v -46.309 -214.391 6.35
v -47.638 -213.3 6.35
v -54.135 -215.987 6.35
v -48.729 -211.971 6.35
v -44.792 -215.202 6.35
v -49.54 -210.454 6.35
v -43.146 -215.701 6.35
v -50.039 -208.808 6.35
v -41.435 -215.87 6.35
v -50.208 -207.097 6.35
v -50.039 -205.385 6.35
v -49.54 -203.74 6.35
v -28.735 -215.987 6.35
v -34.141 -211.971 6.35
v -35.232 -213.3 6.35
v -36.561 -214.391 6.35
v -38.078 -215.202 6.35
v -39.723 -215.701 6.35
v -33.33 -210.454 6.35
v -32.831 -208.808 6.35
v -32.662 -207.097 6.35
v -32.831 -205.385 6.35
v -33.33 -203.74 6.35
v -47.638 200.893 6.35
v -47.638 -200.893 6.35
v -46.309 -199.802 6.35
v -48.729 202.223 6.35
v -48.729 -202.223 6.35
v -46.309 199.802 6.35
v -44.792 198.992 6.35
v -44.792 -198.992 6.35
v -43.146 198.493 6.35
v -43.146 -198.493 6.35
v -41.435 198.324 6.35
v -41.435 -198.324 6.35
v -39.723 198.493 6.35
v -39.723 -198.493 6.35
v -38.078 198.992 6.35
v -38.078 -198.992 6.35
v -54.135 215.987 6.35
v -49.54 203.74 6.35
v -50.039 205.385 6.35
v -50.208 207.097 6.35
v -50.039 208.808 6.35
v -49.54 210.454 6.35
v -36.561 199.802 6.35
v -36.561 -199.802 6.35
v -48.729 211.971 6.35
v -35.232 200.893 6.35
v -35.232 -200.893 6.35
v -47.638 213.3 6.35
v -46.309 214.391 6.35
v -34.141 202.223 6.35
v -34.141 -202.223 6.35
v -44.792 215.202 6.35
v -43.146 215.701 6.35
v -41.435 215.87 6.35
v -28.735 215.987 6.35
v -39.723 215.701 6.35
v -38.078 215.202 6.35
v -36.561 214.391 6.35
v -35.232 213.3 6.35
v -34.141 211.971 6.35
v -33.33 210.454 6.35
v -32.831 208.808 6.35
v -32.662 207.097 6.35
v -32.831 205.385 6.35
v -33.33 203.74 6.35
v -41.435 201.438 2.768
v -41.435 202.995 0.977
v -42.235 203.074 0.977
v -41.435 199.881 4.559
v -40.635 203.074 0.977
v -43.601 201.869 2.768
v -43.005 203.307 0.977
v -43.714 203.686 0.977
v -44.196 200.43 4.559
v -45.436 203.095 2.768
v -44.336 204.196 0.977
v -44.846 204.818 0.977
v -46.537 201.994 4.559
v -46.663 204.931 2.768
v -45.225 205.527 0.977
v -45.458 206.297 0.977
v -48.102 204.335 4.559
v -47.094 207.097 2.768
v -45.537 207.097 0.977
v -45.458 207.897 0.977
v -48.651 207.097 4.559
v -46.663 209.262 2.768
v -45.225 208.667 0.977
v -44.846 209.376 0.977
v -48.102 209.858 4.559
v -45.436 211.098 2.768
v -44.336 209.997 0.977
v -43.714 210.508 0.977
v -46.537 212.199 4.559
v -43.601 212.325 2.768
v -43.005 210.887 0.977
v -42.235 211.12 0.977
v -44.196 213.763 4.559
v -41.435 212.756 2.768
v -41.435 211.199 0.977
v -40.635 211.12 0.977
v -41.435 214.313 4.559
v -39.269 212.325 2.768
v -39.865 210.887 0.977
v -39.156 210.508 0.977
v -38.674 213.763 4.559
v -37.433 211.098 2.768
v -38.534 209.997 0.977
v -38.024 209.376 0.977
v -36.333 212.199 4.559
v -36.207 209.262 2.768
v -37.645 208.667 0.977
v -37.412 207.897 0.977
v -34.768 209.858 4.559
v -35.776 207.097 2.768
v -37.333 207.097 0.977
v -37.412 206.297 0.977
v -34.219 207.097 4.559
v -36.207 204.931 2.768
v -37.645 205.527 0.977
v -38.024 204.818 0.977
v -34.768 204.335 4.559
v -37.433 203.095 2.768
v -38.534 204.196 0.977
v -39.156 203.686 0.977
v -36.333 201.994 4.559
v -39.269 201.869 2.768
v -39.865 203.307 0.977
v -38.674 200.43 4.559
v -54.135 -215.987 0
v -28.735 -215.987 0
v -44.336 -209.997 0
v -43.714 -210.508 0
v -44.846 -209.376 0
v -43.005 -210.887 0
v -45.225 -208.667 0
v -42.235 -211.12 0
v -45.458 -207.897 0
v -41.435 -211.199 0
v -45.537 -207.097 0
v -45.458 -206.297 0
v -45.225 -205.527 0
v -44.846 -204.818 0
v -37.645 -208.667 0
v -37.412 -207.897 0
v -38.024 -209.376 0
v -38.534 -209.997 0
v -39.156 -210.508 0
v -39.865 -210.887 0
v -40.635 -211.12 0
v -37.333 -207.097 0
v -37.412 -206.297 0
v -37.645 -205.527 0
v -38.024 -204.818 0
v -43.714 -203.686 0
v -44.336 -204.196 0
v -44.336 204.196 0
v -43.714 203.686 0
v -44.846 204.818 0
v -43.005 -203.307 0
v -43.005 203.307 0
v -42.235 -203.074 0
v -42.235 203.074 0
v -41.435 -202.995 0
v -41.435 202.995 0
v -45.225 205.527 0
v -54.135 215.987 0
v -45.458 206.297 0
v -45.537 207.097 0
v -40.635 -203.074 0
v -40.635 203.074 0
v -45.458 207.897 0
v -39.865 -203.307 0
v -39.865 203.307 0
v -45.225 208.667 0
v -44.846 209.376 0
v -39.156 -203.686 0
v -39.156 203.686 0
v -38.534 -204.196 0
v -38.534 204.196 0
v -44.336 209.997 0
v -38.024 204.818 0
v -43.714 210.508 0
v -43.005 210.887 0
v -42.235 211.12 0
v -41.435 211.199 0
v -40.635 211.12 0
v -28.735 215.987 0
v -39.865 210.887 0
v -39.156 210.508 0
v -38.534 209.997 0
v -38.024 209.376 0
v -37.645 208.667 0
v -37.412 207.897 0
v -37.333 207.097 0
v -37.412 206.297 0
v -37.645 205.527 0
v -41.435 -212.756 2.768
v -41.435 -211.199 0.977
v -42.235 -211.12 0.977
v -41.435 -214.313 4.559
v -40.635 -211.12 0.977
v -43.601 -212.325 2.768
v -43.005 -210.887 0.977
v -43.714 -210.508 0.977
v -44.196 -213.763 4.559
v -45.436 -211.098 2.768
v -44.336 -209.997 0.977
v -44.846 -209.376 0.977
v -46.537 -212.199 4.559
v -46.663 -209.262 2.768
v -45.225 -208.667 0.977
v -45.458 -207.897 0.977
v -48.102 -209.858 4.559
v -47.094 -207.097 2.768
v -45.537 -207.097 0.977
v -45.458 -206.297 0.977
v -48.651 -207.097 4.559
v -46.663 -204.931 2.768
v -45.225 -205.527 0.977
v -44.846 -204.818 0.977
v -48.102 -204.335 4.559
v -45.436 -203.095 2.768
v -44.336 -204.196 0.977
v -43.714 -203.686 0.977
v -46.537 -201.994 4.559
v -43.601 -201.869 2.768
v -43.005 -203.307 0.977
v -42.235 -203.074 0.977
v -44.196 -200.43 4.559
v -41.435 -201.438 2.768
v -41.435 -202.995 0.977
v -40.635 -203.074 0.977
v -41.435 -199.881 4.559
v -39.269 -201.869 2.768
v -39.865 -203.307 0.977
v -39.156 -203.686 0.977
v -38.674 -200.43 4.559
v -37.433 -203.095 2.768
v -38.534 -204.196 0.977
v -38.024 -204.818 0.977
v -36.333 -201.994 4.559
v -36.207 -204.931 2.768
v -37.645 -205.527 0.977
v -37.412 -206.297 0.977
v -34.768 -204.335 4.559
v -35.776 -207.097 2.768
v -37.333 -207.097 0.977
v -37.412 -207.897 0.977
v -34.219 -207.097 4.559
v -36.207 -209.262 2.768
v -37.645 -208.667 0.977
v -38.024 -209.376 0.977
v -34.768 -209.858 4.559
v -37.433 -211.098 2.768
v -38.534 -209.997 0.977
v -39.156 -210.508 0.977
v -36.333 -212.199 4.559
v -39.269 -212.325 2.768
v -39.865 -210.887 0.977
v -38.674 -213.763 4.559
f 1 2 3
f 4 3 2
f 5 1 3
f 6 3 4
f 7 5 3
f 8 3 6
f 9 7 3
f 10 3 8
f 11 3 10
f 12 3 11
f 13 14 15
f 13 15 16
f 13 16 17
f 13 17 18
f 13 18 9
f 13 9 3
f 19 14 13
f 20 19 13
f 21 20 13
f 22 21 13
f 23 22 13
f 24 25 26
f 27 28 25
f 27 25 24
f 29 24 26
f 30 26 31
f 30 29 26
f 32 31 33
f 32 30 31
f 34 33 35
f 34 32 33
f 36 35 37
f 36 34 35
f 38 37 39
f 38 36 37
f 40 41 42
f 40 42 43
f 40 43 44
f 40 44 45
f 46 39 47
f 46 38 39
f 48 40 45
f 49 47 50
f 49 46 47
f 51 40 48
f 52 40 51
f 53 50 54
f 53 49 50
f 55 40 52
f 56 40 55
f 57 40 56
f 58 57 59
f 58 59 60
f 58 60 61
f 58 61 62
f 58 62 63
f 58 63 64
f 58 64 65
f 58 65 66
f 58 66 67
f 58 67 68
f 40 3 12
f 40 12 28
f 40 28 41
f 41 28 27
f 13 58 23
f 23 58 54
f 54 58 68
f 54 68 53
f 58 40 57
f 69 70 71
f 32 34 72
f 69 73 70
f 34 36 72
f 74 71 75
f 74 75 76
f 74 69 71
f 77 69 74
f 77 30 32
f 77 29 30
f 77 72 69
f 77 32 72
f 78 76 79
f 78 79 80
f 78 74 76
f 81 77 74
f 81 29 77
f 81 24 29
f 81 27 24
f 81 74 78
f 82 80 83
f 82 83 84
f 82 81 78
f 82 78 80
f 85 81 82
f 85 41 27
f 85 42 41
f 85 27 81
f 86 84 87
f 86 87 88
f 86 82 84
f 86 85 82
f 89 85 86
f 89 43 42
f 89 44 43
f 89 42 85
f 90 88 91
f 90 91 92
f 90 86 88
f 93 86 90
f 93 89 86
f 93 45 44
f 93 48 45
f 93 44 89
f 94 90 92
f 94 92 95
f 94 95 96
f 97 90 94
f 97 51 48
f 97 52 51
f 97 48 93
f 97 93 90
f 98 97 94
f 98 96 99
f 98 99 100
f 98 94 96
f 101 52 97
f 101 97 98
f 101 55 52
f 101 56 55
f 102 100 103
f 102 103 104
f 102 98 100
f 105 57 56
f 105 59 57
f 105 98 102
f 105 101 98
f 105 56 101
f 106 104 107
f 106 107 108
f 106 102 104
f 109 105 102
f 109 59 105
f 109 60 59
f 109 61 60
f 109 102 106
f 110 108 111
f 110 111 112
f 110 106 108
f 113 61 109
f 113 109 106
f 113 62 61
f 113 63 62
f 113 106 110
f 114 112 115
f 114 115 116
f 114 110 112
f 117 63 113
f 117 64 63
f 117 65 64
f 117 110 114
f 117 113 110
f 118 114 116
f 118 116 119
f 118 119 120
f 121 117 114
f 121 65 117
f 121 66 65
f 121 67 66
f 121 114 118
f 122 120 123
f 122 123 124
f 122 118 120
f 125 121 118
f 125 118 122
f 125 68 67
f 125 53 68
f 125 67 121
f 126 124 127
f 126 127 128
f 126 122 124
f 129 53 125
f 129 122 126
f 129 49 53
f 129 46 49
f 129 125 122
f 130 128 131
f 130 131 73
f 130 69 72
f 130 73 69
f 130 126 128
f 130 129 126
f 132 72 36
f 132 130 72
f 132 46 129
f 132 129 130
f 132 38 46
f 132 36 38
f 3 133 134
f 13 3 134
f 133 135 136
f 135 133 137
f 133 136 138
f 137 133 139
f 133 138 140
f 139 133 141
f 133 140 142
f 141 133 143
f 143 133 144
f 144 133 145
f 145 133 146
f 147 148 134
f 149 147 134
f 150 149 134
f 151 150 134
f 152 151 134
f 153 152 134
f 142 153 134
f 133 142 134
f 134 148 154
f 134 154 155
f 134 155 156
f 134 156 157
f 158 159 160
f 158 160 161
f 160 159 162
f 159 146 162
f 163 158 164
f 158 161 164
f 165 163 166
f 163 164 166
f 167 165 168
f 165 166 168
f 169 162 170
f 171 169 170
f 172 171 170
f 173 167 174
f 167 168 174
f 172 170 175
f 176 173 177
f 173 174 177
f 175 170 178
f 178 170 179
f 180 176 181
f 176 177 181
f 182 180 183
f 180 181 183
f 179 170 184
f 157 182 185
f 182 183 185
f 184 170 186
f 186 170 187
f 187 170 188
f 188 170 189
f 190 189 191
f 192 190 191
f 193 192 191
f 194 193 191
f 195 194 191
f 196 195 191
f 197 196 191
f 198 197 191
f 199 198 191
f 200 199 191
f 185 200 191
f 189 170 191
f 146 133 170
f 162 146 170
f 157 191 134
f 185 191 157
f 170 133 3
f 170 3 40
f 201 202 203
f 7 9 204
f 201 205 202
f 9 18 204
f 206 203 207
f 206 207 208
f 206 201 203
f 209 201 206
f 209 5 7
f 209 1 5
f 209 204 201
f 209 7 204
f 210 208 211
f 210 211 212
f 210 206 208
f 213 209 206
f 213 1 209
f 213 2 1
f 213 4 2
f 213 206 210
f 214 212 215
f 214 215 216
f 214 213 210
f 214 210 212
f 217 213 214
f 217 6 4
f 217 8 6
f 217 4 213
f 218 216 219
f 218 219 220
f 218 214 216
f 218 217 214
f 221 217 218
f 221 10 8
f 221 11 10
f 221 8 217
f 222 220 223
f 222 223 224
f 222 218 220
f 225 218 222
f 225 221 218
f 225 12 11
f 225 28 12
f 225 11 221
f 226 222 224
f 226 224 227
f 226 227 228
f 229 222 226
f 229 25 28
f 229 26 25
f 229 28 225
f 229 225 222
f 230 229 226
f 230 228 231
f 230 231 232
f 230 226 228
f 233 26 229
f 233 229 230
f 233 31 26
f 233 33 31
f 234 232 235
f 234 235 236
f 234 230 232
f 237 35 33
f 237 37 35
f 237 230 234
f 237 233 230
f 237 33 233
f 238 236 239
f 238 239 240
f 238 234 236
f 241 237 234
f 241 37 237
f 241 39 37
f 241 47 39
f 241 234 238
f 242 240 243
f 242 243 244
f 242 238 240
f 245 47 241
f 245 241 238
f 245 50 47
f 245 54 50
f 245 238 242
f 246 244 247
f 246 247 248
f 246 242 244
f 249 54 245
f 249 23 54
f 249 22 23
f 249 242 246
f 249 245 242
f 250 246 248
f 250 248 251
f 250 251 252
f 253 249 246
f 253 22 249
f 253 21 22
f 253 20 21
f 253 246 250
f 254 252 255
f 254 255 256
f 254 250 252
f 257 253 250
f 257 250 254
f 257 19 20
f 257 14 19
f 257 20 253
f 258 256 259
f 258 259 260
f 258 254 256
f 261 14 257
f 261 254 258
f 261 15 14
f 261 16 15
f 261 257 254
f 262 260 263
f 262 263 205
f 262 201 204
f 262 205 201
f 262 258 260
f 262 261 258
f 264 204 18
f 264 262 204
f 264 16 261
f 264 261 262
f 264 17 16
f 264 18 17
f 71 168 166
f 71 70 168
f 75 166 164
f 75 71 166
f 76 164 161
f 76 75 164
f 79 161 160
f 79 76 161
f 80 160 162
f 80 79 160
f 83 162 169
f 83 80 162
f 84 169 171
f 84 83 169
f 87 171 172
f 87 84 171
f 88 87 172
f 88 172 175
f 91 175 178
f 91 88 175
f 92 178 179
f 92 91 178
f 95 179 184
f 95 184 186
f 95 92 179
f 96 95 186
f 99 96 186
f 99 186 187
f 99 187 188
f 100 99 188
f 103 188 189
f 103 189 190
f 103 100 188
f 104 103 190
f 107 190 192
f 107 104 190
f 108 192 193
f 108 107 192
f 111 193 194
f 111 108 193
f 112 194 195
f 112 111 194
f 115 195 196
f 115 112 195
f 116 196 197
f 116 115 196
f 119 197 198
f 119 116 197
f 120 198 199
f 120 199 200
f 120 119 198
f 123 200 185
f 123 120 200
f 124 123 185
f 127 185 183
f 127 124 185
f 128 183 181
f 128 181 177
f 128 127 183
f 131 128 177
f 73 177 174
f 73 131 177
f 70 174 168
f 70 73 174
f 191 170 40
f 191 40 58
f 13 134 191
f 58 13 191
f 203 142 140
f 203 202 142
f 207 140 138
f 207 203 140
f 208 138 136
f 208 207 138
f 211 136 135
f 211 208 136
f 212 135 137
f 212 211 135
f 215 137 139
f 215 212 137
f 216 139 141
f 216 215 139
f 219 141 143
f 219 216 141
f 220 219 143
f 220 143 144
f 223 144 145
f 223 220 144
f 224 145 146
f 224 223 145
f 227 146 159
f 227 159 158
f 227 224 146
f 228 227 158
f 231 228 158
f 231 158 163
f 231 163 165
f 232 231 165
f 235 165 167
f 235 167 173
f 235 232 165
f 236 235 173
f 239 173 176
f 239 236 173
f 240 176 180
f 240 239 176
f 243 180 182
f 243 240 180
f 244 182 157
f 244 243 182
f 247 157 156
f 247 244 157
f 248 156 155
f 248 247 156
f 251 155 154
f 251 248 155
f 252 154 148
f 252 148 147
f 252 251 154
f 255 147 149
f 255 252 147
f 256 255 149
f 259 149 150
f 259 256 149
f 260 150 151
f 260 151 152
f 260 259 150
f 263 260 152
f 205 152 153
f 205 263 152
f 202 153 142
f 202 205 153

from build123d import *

# Parameters (mm, degrees)
SKETCH1_W                                    = 25.4
SKETCH1_H                                    = 431.973597558
EXTRUDE1_DEPTH                               = 6.35
CSK_FOR_5_16_FLAT_HEAD_SOCKET_CAP_SC_2_COUNT = 2
CSK_FOR_5_16_FLAT_HEAD_SOCKET_CAP_SC_2_PITCH = 414.193597559


with BuildPart() as part:
    # Sketch1 → Extrude1 (new body)
    with BuildSketch(Plane.XY):
        with Locations((-41.434947789, 0)):
            Rectangle(SKETCH1_W, SKETCH1_H)
    extrude(amount=EXTRUDE1_DEPTH)

    # Sketch4 → CSK for 5/16 Flat Head Socket Cap Screw1 (revolve, cut)
    with BuildSketch(Plane(origin=(-41.434947789, 207.096798779, 6.35), x_dir=(0, -1, 0), z_dir=(1, 0, 0))):
        Polygon((0, 0), (0, 6.35), (4.1021, 6.35), (4.1021, 5.373016172), (8.7727917, 0), align=None)
    csk_for_5_16_flat_head_socket_cap_screw1 = revolve(axis=Axis((-41.434947789, 207.096798779, 12.7), (0, 0, -1)), mode=Mode.SUBTRACT)

    # CSK for 5_16 Flat Head Socket Cap Sc 2: CSK for 5/16 Flat Head Socket Cap Screw1 ×2
    with Locations(*[(0, -i * CSK_FOR_5_16_FLAT_HEAD_SOCKET_CAP_SC_2_PITCH, 0) for i in range(1, CSK_FOR_5_16_FLAT_HEAD_SOCKET_CAP_SC_2_COUNT)]):
        add(csk_for_5_16_flat_head_socket_cap_screw1, mode=Mode.SUBTRACT)


solid = part.part
